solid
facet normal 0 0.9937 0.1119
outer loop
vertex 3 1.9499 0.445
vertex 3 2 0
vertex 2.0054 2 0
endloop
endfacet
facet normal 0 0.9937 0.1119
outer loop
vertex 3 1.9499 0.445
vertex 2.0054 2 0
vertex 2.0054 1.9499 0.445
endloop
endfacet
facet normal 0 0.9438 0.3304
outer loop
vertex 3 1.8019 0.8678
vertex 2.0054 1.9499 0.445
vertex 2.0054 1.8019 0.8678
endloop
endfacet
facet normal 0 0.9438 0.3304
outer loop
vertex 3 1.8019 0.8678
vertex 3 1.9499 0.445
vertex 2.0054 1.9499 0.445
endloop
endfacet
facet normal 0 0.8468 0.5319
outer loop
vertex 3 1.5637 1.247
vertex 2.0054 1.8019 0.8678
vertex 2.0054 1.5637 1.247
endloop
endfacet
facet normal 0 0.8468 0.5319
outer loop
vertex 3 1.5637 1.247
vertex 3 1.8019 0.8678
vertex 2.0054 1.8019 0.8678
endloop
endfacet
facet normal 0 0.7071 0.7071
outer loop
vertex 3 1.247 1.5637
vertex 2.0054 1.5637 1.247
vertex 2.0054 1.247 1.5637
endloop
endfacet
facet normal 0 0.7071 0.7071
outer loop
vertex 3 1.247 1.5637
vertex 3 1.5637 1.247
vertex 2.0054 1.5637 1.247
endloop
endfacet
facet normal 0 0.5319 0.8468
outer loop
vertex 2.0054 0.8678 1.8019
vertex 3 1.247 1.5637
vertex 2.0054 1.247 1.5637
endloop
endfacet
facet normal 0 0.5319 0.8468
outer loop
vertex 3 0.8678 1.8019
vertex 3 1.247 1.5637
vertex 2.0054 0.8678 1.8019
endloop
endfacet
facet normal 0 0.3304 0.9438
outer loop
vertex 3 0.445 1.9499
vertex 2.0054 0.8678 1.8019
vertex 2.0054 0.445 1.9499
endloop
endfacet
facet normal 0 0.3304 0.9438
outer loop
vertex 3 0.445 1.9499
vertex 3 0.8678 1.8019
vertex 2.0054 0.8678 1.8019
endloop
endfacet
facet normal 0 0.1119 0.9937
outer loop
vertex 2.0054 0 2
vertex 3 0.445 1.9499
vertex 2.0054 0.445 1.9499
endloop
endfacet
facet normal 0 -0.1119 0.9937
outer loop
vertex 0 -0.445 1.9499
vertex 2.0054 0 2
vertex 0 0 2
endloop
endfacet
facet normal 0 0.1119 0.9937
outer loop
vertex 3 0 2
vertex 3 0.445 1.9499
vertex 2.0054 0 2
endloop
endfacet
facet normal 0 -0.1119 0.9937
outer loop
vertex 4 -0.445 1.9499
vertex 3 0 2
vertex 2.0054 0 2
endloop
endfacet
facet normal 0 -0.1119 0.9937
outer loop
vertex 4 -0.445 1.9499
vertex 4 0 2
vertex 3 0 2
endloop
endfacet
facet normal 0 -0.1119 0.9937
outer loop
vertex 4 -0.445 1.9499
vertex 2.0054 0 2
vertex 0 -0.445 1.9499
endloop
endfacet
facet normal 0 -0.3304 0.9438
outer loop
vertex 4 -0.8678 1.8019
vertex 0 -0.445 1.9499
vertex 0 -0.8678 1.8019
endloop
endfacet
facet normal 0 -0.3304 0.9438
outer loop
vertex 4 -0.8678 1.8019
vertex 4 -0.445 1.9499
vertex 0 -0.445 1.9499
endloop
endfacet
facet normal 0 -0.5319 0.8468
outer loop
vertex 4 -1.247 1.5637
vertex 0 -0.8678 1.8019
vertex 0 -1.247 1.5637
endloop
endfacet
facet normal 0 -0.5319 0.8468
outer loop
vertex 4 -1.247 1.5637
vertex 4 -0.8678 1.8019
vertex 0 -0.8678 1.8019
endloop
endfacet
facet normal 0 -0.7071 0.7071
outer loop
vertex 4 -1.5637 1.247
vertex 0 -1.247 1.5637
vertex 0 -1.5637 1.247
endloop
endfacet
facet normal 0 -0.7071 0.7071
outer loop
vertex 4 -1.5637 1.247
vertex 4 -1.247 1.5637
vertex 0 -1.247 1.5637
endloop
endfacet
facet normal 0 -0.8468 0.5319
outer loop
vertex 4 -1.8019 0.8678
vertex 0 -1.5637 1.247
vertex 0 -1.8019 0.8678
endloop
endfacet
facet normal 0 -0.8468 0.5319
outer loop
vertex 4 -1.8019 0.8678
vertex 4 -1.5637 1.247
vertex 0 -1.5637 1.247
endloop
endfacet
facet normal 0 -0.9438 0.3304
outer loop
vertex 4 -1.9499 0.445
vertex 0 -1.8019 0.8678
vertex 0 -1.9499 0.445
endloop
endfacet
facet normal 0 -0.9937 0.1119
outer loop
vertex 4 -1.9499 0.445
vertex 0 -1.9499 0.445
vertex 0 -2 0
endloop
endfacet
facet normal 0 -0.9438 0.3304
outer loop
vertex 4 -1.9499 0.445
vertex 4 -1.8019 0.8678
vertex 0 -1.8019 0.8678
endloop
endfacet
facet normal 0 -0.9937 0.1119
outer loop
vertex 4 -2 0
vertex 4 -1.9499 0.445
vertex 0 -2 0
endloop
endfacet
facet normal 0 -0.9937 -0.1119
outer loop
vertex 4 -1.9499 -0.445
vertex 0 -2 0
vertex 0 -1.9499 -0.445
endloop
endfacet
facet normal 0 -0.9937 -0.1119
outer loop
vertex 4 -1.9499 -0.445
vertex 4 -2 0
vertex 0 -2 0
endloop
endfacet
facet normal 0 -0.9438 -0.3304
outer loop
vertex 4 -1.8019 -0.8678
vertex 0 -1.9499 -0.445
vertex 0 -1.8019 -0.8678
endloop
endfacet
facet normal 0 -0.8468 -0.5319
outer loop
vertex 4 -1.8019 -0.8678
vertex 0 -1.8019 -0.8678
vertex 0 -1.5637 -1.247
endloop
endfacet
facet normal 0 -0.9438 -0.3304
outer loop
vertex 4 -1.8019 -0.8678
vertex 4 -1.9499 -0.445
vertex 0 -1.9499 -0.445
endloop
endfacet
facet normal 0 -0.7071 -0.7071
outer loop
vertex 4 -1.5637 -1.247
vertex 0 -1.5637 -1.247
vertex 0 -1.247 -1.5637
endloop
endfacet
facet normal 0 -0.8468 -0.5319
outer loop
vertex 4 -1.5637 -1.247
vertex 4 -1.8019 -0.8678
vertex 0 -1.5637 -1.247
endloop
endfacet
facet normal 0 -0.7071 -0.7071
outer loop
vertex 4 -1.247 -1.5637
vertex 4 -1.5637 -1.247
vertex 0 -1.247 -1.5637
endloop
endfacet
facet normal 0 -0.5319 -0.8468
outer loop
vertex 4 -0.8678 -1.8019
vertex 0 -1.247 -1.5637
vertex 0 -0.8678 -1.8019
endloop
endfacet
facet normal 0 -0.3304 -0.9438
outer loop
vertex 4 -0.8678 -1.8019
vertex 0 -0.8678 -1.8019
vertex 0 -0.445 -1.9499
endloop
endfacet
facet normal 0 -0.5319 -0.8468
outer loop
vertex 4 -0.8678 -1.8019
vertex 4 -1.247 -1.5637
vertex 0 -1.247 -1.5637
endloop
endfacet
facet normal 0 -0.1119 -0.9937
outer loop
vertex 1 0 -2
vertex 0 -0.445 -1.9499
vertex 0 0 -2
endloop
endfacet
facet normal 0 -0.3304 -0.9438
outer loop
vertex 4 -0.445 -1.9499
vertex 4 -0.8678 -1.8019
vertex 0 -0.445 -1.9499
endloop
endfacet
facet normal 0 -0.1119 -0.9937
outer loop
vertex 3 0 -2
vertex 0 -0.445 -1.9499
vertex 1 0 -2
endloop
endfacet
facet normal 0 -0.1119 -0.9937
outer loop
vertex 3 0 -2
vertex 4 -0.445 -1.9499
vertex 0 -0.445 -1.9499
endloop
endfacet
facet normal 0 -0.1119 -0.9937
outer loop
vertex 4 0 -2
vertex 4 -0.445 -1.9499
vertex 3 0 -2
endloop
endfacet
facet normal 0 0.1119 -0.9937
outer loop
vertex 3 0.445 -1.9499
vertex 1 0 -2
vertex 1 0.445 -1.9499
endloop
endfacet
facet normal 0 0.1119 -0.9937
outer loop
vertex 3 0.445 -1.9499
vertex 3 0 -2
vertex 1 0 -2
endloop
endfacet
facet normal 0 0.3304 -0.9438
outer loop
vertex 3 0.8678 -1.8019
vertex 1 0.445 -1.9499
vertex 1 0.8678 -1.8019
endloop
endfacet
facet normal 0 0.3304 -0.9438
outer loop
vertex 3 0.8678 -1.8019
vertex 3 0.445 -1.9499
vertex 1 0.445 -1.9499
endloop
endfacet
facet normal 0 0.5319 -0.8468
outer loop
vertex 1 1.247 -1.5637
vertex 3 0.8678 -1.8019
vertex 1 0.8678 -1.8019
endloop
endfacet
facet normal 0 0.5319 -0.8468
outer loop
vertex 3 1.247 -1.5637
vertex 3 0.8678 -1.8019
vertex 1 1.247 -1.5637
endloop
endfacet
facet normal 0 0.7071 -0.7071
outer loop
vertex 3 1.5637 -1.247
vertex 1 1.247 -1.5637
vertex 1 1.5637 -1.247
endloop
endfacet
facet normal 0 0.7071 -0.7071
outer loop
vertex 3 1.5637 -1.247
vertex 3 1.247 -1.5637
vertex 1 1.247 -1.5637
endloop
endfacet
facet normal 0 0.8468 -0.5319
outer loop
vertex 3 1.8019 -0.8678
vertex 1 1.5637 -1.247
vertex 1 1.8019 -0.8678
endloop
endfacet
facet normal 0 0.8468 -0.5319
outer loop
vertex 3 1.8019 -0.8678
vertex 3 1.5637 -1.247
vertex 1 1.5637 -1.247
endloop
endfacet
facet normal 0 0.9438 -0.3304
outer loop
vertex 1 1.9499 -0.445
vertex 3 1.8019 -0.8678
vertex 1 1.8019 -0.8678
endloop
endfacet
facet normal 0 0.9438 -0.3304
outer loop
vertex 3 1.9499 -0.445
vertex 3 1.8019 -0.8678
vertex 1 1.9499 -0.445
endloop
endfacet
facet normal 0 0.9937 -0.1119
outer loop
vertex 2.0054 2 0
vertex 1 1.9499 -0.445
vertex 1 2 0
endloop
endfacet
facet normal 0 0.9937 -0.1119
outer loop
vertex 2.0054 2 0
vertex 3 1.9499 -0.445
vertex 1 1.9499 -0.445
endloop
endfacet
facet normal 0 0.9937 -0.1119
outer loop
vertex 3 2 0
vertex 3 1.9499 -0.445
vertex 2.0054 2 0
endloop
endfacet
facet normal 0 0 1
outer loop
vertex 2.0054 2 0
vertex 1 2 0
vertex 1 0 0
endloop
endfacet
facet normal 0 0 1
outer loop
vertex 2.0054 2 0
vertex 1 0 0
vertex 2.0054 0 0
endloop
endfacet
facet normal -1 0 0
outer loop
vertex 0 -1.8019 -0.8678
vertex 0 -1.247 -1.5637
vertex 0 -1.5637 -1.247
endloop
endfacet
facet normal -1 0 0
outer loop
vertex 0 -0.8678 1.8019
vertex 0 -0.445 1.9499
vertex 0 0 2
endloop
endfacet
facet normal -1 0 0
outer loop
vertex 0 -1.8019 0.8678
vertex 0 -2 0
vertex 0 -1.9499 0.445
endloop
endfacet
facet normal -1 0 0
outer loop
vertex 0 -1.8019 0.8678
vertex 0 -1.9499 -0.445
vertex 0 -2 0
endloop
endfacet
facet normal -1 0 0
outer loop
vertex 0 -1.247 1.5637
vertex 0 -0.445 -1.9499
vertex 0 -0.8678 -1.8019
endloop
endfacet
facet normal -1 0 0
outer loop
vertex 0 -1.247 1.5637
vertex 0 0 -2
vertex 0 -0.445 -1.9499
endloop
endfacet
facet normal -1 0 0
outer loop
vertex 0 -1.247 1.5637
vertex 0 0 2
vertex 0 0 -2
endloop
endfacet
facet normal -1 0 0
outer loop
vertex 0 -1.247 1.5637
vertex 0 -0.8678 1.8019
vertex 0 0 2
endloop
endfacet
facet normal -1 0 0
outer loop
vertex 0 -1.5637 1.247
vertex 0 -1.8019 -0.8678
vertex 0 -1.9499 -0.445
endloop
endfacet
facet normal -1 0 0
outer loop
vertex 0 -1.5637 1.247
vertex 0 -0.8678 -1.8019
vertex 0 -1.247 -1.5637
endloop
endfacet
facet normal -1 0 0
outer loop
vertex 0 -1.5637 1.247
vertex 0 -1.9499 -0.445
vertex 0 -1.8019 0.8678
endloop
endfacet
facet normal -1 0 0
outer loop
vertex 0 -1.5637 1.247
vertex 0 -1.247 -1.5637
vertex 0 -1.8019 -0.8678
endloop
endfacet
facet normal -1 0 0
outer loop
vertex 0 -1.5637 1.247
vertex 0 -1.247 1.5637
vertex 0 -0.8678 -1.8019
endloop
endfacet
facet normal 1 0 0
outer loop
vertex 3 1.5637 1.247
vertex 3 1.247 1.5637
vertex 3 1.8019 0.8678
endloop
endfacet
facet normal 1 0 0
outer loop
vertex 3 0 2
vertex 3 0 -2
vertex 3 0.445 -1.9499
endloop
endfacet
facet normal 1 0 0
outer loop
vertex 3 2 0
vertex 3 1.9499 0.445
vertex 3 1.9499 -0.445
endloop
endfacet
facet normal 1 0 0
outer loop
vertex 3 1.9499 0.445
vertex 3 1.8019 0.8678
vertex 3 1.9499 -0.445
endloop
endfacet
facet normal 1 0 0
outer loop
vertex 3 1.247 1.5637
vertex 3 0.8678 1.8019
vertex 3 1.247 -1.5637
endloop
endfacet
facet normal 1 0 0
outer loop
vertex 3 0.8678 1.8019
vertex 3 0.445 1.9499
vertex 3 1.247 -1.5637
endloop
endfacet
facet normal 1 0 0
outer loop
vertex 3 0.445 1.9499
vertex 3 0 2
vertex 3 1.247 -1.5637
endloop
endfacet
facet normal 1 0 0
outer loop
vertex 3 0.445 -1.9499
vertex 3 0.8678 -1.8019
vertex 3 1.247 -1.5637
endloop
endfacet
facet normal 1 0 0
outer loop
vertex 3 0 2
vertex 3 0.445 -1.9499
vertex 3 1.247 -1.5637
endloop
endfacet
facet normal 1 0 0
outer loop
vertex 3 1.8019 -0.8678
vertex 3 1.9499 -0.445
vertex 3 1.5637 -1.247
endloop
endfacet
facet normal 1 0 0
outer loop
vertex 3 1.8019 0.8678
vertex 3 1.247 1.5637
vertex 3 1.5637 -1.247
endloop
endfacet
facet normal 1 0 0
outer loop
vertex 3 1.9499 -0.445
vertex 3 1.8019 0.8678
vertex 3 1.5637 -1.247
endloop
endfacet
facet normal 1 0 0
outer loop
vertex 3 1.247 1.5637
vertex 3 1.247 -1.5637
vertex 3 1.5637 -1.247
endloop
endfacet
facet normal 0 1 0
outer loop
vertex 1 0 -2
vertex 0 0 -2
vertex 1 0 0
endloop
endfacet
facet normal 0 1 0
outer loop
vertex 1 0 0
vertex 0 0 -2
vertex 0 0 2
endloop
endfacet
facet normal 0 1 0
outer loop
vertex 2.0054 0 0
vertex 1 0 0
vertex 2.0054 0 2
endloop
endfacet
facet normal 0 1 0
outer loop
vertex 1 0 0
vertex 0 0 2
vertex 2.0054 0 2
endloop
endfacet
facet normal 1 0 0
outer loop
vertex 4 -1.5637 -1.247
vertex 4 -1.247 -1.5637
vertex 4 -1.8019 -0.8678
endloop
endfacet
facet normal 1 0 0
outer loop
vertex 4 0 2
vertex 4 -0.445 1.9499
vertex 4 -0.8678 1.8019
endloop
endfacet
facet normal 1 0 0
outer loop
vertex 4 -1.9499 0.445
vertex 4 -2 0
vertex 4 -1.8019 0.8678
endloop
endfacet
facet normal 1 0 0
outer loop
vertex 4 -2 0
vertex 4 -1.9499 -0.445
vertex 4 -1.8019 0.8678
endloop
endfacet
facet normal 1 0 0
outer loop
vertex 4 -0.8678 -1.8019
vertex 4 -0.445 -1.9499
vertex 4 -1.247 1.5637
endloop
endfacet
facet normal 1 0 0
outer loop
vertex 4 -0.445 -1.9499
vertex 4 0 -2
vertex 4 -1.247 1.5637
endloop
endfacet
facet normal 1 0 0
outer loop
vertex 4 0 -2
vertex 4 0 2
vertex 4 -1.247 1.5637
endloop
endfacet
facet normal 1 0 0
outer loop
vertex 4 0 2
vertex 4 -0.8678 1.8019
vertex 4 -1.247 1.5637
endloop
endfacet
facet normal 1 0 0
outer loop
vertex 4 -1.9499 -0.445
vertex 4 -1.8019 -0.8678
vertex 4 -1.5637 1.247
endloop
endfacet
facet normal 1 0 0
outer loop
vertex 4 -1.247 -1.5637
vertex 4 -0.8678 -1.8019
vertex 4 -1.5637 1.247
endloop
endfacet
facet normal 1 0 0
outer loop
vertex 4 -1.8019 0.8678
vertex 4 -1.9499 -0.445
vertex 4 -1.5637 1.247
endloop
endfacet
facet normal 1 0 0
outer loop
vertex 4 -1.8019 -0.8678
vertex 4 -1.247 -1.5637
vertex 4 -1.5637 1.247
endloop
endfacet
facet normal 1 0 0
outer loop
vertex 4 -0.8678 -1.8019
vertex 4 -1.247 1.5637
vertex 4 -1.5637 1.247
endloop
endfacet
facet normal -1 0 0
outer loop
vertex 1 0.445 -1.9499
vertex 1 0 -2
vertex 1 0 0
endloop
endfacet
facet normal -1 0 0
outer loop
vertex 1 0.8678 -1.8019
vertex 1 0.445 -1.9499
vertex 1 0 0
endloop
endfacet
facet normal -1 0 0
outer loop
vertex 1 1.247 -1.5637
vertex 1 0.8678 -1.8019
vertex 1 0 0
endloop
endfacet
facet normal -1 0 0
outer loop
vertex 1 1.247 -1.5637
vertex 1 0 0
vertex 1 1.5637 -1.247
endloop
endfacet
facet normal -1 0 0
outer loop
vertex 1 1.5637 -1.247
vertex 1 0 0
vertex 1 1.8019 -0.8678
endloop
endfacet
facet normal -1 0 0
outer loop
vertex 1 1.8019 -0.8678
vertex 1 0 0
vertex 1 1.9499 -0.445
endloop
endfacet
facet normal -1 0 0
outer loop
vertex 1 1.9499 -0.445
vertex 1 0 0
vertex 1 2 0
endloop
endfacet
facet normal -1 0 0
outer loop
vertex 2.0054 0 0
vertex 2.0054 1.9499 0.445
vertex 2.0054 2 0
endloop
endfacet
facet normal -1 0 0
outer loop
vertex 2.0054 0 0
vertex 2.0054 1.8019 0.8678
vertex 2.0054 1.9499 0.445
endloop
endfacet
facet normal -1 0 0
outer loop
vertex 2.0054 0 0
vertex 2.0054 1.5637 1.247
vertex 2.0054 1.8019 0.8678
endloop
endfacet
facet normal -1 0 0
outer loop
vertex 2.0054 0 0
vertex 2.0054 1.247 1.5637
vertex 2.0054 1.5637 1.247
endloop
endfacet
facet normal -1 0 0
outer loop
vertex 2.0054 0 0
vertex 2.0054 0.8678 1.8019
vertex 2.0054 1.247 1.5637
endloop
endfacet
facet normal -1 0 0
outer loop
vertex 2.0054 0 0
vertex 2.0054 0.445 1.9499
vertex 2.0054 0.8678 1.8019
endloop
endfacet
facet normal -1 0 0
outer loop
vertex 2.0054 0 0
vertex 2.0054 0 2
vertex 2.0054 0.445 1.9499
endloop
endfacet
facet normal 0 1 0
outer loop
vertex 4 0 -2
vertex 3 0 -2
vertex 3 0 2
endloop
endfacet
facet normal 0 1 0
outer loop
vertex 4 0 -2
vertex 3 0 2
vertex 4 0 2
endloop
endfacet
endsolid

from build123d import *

# Parameters (mm, degrees)
SKETCH5_W          = 4
SKETCH5_H          = 2
SKETCH6_W          = 1
SKETCH6_H          = 2
CUT_EXTRUDE5_DEPTH = 5.5
SKETCH7_W          = 1.005381091
SKETCH7_H          = 2
CUT_EXTRUDE6_DEPTH = 3


with BuildPart() as part:
    # Sketch5 → Revolve-Thin2 (revolve)
    with BuildSketch(Plane.XY):
        with Locations((2, 1)):
            Rectangle(SKETCH5_W, SKETCH5_H)
    revolve(axis=Axis((0, 0, 0), (1, 0, 0)))

    # Sketch6 → Cut-Extrude5 (cut, symmetric)
    with BuildSketch(Plane.XY):
        with Locations((3.5, 1)):
            Rectangle(SKETCH6_W, SKETCH6_H)
        with Locations((0.5, 1)):
            Rectangle(SKETCH6_W, SKETCH6_H)
    extrude(amount=CUT_EXTRUDE5_DEPTH, both=True, mode=Mode.SUBTRACT)

    # Sketch7 → Cut-Extrude6 (cut)
    with BuildSketch(Plane(origin=(0, 0, 0), x_dir=(1, 0, 0), z_dir=(0, 1, 0))):
        with Locations((1.502690546, -1)):
            Rectangle(SKETCH7_W, SKETCH7_H)
    extrude(amount=CUT_EXTRUDE6_DEPTH, mode=Mode.SUBTRACT)


solid = part.part
